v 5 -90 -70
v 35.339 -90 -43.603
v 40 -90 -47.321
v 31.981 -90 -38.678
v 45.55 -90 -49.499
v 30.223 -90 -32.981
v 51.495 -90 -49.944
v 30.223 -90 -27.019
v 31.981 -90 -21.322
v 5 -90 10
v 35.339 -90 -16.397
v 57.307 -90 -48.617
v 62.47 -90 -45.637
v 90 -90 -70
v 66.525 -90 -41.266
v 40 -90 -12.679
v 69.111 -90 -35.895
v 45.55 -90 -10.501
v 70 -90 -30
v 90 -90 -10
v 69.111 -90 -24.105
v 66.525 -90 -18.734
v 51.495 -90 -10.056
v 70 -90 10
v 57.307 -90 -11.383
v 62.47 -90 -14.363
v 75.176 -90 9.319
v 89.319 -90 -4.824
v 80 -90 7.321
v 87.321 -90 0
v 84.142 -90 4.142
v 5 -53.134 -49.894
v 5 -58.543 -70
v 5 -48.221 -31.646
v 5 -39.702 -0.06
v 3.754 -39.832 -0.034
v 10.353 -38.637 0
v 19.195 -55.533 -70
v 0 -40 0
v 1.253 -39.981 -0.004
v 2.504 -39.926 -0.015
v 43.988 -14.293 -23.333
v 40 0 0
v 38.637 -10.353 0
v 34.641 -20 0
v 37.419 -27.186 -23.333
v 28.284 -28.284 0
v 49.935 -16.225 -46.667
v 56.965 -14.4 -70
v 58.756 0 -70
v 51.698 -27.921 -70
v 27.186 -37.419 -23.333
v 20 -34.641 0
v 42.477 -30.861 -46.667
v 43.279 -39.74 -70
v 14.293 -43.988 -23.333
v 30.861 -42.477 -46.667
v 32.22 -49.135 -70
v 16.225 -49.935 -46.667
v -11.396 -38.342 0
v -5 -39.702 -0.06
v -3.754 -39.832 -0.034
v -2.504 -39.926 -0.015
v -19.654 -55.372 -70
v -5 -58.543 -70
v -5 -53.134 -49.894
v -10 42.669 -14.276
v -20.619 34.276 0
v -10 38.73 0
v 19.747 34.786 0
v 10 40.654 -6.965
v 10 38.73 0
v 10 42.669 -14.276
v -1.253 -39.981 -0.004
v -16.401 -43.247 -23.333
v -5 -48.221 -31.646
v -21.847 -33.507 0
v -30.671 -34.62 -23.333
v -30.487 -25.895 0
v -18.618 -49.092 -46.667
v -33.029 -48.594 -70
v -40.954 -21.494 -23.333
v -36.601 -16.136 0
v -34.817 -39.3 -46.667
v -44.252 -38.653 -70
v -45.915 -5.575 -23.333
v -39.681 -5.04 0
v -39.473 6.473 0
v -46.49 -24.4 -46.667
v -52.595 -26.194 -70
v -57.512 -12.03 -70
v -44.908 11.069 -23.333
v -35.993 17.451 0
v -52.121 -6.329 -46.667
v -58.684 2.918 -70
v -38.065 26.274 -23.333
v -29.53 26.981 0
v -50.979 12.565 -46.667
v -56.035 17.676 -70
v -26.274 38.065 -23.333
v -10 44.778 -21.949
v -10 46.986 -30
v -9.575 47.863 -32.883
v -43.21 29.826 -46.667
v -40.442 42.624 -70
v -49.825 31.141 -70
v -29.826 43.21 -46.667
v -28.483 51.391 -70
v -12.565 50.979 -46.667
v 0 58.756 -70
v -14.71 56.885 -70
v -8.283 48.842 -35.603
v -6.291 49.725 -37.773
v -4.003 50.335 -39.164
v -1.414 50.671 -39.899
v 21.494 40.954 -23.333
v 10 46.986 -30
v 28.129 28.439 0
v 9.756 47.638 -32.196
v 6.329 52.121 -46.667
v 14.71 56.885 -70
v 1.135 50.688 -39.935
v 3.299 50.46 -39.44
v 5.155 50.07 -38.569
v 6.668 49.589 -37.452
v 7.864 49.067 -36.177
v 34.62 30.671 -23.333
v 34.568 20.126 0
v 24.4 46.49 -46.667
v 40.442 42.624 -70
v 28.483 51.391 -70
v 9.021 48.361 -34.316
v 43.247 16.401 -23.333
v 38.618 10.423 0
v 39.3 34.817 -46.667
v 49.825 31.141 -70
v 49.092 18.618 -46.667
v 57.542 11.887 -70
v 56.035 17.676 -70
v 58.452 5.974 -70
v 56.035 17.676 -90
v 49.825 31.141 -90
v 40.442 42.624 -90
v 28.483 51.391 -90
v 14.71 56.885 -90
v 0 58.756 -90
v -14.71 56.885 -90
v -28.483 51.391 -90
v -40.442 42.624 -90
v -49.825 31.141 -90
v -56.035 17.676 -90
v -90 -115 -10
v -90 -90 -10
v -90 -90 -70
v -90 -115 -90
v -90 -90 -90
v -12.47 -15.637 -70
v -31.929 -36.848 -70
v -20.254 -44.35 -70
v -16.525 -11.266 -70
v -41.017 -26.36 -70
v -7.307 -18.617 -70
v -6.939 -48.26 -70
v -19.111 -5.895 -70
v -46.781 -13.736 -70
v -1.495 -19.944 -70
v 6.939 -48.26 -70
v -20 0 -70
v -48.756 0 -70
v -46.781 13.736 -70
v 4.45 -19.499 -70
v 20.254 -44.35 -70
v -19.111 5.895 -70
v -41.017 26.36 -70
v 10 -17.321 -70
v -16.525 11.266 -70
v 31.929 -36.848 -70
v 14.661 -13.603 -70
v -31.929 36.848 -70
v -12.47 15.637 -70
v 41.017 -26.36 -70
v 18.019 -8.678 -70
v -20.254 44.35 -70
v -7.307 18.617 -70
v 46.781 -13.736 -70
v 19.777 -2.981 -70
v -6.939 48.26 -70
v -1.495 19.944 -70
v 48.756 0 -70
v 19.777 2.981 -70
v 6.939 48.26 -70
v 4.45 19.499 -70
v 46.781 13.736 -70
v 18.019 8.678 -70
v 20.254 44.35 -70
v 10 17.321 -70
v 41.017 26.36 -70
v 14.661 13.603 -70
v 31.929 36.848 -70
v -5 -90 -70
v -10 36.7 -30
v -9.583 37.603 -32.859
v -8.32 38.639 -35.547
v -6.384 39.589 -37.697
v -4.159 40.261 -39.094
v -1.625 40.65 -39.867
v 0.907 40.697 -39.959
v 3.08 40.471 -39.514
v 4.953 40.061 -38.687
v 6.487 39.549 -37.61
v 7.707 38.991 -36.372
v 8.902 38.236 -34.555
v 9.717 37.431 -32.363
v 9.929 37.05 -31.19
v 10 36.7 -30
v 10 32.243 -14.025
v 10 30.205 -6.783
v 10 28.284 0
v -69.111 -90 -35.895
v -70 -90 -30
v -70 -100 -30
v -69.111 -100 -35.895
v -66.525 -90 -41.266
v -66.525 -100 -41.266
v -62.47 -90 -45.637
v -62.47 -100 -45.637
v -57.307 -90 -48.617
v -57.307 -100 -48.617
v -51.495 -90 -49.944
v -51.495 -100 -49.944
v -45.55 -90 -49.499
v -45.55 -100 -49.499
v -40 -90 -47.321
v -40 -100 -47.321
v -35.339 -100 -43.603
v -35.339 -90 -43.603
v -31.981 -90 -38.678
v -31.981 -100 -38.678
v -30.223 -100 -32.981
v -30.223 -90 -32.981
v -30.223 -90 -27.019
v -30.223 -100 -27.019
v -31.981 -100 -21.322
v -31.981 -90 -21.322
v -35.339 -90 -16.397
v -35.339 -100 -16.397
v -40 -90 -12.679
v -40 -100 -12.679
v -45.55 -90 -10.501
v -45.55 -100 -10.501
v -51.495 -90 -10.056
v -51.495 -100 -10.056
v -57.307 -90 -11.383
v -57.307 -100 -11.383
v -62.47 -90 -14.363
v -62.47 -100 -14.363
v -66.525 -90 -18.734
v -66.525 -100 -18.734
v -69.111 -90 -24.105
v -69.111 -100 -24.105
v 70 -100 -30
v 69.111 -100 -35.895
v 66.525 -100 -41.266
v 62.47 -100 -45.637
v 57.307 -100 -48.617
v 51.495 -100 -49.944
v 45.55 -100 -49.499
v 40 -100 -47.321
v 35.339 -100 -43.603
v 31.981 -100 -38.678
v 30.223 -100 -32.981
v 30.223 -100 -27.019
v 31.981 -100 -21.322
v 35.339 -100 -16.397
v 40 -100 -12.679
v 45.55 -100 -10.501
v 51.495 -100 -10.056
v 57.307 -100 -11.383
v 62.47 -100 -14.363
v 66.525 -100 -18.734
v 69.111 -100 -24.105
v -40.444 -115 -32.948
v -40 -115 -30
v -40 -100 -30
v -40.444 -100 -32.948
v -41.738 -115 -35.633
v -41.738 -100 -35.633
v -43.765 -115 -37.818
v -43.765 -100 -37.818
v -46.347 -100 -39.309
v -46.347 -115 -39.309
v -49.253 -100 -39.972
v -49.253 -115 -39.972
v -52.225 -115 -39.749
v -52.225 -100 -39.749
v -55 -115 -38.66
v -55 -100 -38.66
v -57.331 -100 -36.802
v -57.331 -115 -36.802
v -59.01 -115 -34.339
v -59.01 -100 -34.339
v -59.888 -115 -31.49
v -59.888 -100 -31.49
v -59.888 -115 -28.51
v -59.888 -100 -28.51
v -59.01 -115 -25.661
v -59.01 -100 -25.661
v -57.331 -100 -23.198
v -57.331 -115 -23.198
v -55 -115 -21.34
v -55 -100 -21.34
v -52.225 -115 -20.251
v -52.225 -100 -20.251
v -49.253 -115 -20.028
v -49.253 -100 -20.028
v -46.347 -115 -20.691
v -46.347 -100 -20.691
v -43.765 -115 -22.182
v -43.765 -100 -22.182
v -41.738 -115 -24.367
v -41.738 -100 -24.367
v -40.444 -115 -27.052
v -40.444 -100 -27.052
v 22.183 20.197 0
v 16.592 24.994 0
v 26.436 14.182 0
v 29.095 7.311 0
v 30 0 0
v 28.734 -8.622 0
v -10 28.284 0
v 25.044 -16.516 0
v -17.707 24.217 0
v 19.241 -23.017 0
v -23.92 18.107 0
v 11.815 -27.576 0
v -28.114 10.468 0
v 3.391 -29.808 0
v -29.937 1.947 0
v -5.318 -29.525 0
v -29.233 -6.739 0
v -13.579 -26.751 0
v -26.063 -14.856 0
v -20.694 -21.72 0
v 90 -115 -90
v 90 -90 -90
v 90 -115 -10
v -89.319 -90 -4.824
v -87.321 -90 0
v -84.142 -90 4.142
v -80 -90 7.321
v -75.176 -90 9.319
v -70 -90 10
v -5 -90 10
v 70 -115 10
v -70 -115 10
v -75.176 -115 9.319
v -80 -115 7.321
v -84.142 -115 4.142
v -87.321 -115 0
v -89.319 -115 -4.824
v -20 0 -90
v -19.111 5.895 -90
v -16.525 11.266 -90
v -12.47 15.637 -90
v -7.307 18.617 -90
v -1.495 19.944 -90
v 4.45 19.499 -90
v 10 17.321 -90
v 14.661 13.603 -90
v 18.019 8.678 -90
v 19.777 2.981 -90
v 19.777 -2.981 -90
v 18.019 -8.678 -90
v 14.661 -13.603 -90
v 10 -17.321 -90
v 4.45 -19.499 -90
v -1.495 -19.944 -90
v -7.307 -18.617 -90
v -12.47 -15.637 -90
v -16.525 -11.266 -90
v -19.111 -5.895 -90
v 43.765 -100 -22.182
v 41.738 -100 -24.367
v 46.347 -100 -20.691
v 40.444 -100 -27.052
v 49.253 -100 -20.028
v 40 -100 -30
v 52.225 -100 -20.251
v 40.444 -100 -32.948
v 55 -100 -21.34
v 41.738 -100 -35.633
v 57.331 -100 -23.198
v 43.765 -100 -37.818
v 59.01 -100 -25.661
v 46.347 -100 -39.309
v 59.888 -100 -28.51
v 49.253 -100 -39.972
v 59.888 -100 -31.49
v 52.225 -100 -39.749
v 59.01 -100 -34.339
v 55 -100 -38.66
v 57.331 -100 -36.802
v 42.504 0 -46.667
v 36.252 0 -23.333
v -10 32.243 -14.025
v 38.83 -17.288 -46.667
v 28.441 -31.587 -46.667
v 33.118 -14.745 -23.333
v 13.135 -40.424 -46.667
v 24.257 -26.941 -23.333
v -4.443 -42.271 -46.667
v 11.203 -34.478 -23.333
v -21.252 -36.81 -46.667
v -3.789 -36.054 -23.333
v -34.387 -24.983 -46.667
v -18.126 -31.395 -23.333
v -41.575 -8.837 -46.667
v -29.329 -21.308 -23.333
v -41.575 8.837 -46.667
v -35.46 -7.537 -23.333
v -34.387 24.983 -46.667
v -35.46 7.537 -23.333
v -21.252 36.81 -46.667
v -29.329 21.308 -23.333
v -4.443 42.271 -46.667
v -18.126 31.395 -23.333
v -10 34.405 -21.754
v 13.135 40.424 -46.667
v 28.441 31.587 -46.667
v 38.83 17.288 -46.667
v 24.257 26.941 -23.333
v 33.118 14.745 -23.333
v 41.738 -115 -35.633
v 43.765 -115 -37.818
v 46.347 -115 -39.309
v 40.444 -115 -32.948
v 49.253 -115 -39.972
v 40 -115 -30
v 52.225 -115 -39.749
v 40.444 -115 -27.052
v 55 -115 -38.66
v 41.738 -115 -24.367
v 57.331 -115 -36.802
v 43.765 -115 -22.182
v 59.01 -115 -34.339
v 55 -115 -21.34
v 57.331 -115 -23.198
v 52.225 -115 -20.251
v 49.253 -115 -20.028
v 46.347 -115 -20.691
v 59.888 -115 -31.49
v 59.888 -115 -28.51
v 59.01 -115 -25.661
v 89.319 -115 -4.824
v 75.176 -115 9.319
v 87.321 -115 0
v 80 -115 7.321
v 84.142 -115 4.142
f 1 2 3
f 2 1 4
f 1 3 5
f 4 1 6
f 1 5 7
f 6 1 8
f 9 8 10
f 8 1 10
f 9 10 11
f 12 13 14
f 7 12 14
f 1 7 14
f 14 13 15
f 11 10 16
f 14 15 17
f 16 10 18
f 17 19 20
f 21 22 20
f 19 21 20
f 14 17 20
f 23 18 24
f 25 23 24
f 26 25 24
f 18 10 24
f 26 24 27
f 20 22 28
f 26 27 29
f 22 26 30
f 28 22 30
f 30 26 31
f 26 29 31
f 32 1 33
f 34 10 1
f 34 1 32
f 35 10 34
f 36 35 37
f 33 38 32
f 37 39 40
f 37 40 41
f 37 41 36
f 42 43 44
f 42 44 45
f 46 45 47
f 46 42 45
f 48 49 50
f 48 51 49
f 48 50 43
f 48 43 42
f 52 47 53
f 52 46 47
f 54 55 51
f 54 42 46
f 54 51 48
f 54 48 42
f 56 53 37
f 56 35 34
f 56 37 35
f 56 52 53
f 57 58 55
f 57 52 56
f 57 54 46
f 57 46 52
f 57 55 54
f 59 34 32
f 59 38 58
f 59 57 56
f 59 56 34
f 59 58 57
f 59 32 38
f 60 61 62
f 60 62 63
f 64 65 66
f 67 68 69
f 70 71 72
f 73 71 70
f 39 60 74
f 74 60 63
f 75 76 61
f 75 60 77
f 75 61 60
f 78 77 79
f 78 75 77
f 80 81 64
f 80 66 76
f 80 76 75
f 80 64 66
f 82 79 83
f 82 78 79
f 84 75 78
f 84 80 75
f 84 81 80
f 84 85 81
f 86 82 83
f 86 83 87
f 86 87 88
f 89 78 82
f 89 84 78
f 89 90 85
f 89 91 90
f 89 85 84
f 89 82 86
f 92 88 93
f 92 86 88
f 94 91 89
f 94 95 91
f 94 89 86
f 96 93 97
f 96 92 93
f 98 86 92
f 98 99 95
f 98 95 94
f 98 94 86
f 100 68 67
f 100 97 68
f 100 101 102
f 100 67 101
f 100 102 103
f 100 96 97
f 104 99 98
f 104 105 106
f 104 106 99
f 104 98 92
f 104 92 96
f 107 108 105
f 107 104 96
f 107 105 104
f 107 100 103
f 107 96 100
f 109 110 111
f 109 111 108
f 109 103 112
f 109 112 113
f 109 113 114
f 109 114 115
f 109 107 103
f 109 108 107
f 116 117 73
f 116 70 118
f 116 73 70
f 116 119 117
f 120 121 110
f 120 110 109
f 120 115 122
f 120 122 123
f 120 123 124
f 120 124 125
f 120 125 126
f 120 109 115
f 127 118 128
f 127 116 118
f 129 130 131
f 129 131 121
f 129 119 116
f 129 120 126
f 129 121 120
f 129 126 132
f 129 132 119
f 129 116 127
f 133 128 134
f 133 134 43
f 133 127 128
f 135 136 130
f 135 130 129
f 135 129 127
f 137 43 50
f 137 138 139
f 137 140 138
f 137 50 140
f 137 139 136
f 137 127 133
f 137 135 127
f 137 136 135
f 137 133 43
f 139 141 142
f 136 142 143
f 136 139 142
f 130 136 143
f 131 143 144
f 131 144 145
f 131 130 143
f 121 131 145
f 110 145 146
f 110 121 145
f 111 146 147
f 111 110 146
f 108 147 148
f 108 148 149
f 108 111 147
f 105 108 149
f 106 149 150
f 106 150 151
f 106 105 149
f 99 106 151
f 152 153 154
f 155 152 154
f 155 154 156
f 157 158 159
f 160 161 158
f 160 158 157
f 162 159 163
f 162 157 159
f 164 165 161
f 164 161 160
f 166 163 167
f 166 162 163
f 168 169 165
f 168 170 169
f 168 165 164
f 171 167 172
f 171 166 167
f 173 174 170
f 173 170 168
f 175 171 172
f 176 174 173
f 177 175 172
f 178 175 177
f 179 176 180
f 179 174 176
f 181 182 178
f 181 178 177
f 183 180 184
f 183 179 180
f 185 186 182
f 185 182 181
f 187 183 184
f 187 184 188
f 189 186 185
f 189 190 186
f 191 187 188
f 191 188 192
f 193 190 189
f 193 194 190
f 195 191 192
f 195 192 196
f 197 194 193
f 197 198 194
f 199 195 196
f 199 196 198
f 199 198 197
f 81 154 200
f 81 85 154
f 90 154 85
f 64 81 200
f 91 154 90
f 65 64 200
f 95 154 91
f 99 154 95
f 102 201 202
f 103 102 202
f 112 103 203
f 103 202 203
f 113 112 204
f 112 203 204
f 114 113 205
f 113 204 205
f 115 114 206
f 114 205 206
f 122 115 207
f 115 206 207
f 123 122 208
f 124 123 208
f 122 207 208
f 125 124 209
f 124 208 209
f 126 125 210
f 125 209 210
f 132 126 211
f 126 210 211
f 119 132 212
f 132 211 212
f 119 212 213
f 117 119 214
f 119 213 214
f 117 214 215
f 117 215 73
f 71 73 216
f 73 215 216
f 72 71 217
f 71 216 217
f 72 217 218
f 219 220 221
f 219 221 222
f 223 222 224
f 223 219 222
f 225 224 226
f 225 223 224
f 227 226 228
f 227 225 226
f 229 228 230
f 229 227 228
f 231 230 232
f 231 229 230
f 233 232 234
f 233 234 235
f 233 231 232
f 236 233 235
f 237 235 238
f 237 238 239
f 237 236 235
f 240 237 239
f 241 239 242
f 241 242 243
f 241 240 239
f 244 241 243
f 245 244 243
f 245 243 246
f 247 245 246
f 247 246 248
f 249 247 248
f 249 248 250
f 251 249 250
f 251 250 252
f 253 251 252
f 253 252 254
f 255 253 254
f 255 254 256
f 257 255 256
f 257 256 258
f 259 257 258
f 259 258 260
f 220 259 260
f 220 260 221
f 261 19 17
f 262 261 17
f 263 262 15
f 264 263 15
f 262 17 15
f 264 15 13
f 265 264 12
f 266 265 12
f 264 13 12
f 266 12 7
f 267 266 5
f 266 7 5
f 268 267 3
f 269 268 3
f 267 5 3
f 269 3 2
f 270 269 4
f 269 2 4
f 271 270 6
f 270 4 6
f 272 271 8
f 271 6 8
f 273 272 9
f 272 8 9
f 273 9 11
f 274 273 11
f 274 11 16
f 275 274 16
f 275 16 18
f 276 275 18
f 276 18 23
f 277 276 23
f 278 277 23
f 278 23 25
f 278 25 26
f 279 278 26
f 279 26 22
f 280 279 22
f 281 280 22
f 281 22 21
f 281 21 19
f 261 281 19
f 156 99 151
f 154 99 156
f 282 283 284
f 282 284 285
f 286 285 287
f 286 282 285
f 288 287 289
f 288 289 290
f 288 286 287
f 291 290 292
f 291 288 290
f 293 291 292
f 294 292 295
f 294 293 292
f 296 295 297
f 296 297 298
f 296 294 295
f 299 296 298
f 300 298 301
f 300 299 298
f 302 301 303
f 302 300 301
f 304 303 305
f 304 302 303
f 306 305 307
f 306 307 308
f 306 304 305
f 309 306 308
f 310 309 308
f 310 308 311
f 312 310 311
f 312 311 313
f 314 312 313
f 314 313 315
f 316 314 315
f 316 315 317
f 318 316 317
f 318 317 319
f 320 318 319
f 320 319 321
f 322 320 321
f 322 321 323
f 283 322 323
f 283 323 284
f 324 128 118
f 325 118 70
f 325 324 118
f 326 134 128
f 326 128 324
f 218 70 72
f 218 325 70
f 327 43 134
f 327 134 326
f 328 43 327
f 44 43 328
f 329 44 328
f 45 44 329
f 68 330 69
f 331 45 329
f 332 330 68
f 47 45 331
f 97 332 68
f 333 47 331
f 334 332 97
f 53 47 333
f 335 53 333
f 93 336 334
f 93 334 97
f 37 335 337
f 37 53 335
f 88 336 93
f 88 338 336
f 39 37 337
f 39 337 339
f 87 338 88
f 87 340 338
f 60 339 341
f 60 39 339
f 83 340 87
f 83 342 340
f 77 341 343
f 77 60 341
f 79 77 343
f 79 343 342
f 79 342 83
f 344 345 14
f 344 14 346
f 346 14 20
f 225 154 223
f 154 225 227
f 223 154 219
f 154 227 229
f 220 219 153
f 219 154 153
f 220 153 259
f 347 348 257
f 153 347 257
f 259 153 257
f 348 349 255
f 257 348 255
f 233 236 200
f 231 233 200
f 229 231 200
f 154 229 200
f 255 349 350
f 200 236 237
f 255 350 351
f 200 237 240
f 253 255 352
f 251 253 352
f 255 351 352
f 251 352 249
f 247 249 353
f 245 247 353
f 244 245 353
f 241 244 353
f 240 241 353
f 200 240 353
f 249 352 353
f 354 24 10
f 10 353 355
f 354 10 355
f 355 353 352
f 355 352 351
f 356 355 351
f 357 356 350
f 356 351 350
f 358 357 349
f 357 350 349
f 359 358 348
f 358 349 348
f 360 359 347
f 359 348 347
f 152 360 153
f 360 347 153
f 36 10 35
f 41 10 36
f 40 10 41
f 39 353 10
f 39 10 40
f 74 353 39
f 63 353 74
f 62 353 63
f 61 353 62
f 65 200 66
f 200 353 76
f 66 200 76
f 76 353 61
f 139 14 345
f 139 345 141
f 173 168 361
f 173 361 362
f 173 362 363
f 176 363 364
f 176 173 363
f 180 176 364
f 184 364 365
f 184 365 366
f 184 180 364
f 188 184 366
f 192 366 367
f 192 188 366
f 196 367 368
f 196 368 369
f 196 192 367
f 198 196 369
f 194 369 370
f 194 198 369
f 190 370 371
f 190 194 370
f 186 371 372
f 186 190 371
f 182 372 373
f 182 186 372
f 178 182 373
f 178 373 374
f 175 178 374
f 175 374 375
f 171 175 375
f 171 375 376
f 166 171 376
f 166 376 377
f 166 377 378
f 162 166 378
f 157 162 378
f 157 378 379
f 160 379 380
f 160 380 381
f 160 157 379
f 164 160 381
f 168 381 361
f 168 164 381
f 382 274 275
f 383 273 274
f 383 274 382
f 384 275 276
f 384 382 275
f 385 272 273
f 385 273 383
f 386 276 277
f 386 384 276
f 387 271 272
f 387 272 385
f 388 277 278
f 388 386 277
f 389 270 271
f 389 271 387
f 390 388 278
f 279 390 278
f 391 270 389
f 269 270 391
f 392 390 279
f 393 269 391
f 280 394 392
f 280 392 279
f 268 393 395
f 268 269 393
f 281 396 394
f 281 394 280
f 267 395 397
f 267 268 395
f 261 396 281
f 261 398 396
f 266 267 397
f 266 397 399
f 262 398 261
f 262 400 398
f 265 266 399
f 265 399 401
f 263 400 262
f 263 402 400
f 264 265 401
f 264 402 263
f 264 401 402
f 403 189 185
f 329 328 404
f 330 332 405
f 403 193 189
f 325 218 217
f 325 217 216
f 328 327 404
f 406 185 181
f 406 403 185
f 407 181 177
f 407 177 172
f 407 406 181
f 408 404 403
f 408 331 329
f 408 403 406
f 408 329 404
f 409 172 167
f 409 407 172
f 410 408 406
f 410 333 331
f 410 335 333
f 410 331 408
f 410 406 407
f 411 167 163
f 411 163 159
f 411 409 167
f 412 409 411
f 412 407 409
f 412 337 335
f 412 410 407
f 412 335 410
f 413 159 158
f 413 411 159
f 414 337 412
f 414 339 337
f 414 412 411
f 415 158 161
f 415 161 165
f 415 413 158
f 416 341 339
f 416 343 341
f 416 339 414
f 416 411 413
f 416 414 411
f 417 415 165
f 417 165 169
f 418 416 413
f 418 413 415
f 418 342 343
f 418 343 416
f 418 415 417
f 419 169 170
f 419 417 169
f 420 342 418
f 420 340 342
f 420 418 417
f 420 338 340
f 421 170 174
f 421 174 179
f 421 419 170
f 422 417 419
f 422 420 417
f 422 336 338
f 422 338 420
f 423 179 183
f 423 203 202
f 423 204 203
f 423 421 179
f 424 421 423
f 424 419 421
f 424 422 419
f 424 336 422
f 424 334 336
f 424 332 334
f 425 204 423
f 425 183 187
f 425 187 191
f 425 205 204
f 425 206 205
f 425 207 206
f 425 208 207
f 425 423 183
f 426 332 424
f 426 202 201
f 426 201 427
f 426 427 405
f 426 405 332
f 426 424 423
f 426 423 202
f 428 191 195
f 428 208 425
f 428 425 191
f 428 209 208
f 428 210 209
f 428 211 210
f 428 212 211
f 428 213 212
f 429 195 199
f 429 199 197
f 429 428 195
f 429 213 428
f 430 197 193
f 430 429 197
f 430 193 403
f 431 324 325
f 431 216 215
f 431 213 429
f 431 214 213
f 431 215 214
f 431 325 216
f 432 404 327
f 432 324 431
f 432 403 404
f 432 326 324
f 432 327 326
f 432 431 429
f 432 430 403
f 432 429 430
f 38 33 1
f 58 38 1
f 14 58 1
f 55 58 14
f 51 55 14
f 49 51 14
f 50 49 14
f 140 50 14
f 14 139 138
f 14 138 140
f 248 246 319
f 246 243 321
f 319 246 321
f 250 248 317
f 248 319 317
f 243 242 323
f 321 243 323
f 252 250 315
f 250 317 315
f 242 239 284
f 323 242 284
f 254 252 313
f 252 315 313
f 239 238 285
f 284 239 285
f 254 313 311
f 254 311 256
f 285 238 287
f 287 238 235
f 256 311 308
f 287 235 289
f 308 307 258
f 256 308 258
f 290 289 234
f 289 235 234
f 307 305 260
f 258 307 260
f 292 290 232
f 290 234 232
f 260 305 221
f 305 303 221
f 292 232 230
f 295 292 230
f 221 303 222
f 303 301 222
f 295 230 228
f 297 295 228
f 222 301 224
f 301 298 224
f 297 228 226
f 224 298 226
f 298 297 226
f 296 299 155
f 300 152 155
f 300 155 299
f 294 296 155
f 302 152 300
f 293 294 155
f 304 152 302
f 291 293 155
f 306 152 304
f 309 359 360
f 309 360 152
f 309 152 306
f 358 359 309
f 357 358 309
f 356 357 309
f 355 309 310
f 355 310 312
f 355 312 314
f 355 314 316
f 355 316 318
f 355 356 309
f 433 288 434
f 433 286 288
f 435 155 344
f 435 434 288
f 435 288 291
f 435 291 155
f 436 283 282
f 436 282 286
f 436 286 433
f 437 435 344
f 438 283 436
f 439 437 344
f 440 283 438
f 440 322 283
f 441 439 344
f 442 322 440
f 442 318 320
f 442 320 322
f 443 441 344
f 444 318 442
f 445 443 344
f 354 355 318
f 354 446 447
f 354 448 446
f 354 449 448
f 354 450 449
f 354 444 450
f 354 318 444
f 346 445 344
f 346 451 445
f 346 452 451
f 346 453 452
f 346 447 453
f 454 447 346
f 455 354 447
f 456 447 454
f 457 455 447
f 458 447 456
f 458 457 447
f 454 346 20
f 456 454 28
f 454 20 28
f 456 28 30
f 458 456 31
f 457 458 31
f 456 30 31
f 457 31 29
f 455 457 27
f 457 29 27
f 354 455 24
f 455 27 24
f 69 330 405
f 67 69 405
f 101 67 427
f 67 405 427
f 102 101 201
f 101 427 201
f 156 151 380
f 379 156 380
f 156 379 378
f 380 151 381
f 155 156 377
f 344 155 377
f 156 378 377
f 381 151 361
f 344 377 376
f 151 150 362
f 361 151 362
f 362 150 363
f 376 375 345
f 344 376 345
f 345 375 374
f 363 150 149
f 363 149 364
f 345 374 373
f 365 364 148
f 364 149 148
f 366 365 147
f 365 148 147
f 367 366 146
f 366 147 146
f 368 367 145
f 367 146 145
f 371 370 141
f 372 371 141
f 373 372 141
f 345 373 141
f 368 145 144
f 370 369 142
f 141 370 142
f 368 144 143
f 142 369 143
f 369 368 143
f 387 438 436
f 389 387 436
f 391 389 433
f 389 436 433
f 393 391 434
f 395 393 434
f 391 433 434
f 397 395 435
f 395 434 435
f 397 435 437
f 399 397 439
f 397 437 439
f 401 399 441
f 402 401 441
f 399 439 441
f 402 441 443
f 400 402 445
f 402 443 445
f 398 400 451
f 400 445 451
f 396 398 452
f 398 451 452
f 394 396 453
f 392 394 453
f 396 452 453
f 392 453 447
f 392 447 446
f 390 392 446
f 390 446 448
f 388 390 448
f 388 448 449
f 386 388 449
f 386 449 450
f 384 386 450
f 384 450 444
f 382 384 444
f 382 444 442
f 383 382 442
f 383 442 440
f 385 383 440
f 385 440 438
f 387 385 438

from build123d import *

# Parameters (mm, degrees)
SKETCH2_R           = 20
BOSS_EXTRUDE1_DEPTH = 20
BOSS_EXTRUDE2_DEPTH = 25
CUT_EXTRUDE1_DEPTH  = 172.537167984
RIB1_REACH          = 173.537
SKETCH5_WALL_W      = 396.064531104
SKETCH5_WALL_H      = 10
HOLE1_D             = 20
HOLE1_DEPTH         = 25
HOLE1_CBORE_D       = 40
HOLE1_CBORE_DEPTH   = 10


with BuildPart() as part:
    # Sketch1 → Revolve1 (revolve)
    with BuildSketch(Plane(origin=(0, 0, 0), x_dir=(0, 0, -1), z_dir=(1, 0, 0)), mode=Mode.PRIVATE) as revolve1_sk:
        Polygon((0, 30), (0, 40), (70, 58.75644347), (70, 48.75644347), align=None)
    revolve(revolve1_sk.sketch.rotate(Axis((0, 0, 0), (0, 0, -1)), 90), axis=Axis((0, 0, 0), (0, 0, -1)))

    # Sketch2 → Boss-Extrude1 (add)
    with BuildSketch(Plane(origin=(0, 0, -70), x_dir=(-1, 0, 0), z_dir=(0, 0, -1))):
        with BuildLine():
            Line((90, -90), (-90, -90))
            Line((-90, -90), (-56.03473707, 17.675629856))
            ThreePointArc((-56.03473707, 17.675629856), (0, 58.75644347), (56.03473707, 17.675629856))
            Line((56.03473707, 17.675629856), (90, -90))
        make_face()
        Circle(SKETCH2_R, mode=Mode.SUBTRACT)
    extrude(amount=BOSS_EXTRUDE1_DEPTH)

    # Sketch3 → Boss-Extrude2 (add)
    with BuildSketch(Plane.XZ.offset(90)):
        with BuildLine():
            Line((-90, -90), (90, -90))
            Line((90, -90), (90, -10))
            ThreePointArc((90, -10), (84.142135624, 4.142135624), (70, 10))
            Line((70, 10), (-70, 10))
            ThreePointArc((-70, 10), (-84.142135624, 4.142135624), (-90, -10))
            Line((-90, -10), (-90, -90))
        make_face()
    extrude(amount=BOSS_EXTRUDE2_DEPTH)

    # Sketch4 → Cut-Extrude1 (cut, through all)
    with BuildSketch(Plane(origin=(0, 0, 0), x_dir=(1, 0, 0), z_dir=(0, 1, 0))):
        with BuildLine():
            Line((-10, -30), (-10, 30))
            ThreePointArc((-10, 30), (0, 40), (10, 30))
            Line((10, 30), (10, -30))
            ThreePointArc((10, -30), (0, -40), (-10, -30))
        make_face()
    extrude(amount=CUT_EXTRUDE1_DEPTH, mode=Mode.SUBTRACT)

    # Sketch5 wall → Rib1 (add, up to next)
    with BuildSketch(Plane(origin=(0, -65, 5), x_dir=(0, 0.980580675691, -0.196116135138), z_dir=(0, 0.196116135138, 0.980580675691)), mode=Mode.PRIVATE) as rib1_sk1:
        Rectangle(SKETCH5_WALL_W, SKETCH5_WALL_H)
    rib1_tool1 = extrude(rib1_sk1.sketch, amount=-RIB1_REACH, mode=Mode.PRIVATE) - part.part
    add(rib1_tool1.solids().sort_by_distance((0, -65, 5))[0])

    # Hole1
    with Locations(Plane(origin=(0, -90, 0), x_dir=(1, 0, 0), z_dir=(0, 1, 0))):
        with Locations((50, 30)):
            hole1 = CounterBoreHole(HOLE1_D / 2, HOLE1_CBORE_D / 2, HOLE1_CBORE_DEPTH, depth=HOLE1_DEPTH)

    # Mirror1: Hole1 across plane
    add(hole1.mirror(Plane(origin=(0, 0, 0), x_dir=(0, 0, 1), z_dir=(1, 0, 0))), mode=Mode.SUBTRACT)


solid = part.part
